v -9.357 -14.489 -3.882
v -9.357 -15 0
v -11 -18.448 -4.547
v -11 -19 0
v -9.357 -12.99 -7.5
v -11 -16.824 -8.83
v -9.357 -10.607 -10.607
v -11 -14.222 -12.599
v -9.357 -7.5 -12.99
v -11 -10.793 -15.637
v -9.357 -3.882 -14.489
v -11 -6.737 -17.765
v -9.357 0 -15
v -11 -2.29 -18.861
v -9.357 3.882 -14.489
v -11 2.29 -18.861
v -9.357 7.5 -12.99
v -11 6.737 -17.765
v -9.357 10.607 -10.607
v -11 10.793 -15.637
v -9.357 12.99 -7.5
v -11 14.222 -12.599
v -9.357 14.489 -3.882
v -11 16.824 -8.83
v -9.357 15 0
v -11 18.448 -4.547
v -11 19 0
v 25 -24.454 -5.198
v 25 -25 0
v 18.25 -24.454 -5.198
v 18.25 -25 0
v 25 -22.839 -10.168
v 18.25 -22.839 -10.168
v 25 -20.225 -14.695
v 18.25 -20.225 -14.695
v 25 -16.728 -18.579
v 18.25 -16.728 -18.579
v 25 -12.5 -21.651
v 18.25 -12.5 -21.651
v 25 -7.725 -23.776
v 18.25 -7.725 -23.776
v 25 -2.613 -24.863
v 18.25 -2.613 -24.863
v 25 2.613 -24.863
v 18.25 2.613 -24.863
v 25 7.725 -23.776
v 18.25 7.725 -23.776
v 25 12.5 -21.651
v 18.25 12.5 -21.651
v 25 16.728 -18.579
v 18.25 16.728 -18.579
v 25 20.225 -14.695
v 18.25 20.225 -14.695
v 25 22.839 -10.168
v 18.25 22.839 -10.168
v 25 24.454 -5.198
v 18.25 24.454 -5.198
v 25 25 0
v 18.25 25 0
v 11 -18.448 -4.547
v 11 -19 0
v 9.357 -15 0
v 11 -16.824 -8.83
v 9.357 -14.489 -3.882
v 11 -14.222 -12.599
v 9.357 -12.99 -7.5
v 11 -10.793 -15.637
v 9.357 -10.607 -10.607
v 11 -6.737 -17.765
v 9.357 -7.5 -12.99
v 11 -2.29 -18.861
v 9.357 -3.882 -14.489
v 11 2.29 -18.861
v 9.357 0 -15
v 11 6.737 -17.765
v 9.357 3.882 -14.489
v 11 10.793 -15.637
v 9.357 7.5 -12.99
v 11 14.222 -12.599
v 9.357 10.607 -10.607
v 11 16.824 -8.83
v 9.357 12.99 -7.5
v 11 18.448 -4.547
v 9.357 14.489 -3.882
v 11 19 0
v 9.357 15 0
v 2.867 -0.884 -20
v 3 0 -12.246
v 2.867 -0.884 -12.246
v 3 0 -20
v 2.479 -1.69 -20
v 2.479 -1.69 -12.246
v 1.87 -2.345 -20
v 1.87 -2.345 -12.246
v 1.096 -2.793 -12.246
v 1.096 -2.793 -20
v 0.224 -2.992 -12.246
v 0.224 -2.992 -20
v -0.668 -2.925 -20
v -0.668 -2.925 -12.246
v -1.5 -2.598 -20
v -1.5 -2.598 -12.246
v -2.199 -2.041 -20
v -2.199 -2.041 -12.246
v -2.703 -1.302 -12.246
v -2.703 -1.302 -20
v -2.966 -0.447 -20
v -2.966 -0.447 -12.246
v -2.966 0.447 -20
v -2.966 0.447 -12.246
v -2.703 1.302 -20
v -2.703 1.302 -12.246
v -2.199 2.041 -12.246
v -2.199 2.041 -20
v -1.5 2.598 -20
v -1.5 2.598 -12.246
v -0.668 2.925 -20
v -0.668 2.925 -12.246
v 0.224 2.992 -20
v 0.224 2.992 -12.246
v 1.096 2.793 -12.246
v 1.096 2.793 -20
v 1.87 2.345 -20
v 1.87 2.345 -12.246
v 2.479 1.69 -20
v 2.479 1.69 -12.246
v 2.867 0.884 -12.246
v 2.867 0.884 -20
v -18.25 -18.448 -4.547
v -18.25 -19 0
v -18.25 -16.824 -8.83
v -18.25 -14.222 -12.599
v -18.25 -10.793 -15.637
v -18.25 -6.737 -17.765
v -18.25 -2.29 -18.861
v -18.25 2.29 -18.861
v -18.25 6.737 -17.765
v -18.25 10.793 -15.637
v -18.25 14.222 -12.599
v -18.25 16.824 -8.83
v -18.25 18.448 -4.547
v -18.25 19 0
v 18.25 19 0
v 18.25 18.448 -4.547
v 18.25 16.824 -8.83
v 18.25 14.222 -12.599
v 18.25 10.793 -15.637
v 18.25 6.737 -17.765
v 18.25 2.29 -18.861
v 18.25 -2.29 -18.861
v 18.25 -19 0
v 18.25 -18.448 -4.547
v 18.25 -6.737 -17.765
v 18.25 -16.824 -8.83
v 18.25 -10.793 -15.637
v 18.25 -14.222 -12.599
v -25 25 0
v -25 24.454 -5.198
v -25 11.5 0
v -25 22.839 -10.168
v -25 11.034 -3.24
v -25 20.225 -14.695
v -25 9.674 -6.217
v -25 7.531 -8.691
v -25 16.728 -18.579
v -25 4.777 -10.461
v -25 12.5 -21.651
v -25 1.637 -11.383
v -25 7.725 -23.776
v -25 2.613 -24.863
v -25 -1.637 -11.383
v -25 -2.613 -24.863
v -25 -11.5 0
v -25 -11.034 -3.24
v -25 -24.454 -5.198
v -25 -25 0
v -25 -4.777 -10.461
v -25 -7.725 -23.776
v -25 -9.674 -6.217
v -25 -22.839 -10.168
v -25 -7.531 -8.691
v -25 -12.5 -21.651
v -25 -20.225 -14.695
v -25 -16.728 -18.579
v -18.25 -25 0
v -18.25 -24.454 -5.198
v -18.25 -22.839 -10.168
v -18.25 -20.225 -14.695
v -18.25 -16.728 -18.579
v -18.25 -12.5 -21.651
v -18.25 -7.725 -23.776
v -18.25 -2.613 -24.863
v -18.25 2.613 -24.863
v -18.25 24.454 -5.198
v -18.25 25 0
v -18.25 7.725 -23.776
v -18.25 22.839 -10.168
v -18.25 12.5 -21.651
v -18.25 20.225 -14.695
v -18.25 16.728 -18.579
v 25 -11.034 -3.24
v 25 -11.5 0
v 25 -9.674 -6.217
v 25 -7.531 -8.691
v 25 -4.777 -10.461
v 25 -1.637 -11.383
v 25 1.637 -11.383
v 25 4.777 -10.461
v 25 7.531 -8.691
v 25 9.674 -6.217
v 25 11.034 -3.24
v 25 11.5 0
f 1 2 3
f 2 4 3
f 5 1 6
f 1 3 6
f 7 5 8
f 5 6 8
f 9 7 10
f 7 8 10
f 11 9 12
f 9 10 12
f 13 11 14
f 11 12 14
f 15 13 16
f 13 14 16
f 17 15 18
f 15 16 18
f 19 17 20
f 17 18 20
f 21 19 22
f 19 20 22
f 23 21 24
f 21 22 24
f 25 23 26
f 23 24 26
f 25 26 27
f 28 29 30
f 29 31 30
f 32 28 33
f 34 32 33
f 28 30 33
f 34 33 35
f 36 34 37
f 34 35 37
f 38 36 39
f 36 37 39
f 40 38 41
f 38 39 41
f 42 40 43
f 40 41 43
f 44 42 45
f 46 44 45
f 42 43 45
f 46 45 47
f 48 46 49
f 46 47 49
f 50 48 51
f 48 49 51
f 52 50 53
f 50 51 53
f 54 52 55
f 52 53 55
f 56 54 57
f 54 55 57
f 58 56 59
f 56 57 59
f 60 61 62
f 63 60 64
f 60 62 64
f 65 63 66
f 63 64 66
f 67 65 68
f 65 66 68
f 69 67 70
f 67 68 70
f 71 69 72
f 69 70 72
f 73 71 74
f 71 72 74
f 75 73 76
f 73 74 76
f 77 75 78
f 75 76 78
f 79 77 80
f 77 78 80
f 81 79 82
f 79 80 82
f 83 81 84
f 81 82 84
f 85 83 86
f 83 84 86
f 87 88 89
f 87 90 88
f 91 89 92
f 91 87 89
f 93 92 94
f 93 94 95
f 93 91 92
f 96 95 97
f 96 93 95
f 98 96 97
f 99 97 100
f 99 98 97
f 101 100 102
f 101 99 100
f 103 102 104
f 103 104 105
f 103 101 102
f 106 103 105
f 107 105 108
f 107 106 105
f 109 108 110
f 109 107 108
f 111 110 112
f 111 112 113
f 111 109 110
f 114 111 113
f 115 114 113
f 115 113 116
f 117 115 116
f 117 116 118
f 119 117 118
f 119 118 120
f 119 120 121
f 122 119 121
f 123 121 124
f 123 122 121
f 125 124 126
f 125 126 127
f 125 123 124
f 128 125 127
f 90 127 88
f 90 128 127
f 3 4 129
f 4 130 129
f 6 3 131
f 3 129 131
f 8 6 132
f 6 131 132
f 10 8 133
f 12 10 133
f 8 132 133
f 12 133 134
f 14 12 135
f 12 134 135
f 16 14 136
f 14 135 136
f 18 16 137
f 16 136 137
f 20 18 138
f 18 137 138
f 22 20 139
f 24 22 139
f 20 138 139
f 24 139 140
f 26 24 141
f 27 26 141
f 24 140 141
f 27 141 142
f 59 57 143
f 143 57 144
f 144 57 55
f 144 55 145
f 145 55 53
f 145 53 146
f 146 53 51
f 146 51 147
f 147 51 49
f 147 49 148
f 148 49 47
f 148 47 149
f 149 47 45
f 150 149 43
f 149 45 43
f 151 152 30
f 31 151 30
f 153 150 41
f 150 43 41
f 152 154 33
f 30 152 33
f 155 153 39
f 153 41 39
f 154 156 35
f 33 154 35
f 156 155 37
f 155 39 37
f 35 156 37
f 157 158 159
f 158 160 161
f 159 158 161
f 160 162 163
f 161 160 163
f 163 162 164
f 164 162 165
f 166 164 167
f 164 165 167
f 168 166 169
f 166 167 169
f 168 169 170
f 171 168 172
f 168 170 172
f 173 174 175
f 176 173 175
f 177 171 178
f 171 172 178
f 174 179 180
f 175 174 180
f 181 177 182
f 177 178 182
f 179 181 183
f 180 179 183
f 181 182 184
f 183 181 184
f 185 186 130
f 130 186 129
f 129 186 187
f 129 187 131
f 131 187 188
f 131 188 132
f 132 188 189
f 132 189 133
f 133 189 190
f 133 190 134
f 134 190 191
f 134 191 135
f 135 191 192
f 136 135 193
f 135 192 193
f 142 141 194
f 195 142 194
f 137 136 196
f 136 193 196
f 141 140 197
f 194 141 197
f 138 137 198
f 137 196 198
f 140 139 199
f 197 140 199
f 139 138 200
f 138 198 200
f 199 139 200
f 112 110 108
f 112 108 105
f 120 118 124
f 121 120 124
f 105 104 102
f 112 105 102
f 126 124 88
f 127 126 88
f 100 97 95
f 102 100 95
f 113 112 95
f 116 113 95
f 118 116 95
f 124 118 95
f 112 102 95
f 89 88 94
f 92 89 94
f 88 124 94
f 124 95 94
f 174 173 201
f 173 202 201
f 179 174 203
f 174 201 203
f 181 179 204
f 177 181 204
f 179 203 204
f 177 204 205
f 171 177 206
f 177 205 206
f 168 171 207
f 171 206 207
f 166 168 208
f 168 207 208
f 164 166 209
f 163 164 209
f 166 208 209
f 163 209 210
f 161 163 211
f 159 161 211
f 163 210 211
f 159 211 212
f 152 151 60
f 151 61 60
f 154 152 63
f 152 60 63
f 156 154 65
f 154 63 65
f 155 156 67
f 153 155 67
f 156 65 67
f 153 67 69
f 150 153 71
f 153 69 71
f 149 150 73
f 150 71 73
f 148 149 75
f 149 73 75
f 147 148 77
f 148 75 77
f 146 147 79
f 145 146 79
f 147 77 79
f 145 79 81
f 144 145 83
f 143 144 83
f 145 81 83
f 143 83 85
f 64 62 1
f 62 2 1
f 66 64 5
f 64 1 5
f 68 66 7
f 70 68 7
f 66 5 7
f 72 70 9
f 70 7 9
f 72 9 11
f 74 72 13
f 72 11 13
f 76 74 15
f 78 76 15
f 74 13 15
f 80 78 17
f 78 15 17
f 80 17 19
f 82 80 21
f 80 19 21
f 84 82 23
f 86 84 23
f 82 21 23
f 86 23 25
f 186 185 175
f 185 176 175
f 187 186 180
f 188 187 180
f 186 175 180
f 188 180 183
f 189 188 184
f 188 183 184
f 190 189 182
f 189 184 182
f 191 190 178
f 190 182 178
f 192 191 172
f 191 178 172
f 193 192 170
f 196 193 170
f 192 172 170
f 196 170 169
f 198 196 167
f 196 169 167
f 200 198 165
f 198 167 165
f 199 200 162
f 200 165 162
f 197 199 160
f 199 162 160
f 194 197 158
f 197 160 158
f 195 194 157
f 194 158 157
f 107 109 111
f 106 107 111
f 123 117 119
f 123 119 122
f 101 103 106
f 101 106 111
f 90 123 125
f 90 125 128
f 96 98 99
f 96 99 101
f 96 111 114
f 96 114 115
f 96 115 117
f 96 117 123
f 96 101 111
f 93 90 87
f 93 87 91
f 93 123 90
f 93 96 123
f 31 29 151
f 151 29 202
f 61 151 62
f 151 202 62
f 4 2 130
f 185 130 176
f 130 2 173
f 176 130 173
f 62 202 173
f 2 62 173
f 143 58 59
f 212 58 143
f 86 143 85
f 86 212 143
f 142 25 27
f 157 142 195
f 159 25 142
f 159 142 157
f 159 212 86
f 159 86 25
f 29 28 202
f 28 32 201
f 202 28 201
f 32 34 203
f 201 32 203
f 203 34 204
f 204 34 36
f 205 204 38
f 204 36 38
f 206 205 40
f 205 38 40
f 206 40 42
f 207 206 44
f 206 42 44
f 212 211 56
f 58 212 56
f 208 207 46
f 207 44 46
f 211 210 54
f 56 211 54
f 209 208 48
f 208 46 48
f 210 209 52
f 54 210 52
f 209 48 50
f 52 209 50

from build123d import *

# Parameters (mm, degrees)
REVOLVE1_ANGLE = 180
SKETCH2_W      = 3
SKETCH2_H      = 7.753714539


with BuildPart() as part:
    # Sketch1 → Revolve1 (revolve)
    with BuildSketch(Plane.XY):
        Polygon((-25, -11.5), (25, -11.5), (25, -25), (18.25, -25), (18.25, -19), (11, -19), (9.357289528, -15), (-9.357289528, -15), (-11, -19), (-18.25, -19), (-18.25, -25), (-25, -25), align=None)
    revolve(axis=Axis((-23.878950705, 0, 0), (1, 0, 0)), revolution_arc=REVOLVE1_ANGLE)


with BuildPart() as body_2:
    # Sketch2 → Revolve2 (revolve)
    with BuildSketch(Plane(origin=(0, 0, 0), x_dir=(1, 0, 0), z_dir=(0, 1, 0)), mode=Mode.PRIVATE) as revolve2_sk:
        with Locations((-1.5, 16.12314273)):
            Rectangle(SKETCH2_W, SKETCH2_H)
    revolve(revolve2_sk.sketch.rotate(Axis((0, 0, 0), (0, 0, -1)), 180), axis=Axis((0, 0, 0), (0, 0, -1)))


solid = Compound([part.part, body_2.part])
